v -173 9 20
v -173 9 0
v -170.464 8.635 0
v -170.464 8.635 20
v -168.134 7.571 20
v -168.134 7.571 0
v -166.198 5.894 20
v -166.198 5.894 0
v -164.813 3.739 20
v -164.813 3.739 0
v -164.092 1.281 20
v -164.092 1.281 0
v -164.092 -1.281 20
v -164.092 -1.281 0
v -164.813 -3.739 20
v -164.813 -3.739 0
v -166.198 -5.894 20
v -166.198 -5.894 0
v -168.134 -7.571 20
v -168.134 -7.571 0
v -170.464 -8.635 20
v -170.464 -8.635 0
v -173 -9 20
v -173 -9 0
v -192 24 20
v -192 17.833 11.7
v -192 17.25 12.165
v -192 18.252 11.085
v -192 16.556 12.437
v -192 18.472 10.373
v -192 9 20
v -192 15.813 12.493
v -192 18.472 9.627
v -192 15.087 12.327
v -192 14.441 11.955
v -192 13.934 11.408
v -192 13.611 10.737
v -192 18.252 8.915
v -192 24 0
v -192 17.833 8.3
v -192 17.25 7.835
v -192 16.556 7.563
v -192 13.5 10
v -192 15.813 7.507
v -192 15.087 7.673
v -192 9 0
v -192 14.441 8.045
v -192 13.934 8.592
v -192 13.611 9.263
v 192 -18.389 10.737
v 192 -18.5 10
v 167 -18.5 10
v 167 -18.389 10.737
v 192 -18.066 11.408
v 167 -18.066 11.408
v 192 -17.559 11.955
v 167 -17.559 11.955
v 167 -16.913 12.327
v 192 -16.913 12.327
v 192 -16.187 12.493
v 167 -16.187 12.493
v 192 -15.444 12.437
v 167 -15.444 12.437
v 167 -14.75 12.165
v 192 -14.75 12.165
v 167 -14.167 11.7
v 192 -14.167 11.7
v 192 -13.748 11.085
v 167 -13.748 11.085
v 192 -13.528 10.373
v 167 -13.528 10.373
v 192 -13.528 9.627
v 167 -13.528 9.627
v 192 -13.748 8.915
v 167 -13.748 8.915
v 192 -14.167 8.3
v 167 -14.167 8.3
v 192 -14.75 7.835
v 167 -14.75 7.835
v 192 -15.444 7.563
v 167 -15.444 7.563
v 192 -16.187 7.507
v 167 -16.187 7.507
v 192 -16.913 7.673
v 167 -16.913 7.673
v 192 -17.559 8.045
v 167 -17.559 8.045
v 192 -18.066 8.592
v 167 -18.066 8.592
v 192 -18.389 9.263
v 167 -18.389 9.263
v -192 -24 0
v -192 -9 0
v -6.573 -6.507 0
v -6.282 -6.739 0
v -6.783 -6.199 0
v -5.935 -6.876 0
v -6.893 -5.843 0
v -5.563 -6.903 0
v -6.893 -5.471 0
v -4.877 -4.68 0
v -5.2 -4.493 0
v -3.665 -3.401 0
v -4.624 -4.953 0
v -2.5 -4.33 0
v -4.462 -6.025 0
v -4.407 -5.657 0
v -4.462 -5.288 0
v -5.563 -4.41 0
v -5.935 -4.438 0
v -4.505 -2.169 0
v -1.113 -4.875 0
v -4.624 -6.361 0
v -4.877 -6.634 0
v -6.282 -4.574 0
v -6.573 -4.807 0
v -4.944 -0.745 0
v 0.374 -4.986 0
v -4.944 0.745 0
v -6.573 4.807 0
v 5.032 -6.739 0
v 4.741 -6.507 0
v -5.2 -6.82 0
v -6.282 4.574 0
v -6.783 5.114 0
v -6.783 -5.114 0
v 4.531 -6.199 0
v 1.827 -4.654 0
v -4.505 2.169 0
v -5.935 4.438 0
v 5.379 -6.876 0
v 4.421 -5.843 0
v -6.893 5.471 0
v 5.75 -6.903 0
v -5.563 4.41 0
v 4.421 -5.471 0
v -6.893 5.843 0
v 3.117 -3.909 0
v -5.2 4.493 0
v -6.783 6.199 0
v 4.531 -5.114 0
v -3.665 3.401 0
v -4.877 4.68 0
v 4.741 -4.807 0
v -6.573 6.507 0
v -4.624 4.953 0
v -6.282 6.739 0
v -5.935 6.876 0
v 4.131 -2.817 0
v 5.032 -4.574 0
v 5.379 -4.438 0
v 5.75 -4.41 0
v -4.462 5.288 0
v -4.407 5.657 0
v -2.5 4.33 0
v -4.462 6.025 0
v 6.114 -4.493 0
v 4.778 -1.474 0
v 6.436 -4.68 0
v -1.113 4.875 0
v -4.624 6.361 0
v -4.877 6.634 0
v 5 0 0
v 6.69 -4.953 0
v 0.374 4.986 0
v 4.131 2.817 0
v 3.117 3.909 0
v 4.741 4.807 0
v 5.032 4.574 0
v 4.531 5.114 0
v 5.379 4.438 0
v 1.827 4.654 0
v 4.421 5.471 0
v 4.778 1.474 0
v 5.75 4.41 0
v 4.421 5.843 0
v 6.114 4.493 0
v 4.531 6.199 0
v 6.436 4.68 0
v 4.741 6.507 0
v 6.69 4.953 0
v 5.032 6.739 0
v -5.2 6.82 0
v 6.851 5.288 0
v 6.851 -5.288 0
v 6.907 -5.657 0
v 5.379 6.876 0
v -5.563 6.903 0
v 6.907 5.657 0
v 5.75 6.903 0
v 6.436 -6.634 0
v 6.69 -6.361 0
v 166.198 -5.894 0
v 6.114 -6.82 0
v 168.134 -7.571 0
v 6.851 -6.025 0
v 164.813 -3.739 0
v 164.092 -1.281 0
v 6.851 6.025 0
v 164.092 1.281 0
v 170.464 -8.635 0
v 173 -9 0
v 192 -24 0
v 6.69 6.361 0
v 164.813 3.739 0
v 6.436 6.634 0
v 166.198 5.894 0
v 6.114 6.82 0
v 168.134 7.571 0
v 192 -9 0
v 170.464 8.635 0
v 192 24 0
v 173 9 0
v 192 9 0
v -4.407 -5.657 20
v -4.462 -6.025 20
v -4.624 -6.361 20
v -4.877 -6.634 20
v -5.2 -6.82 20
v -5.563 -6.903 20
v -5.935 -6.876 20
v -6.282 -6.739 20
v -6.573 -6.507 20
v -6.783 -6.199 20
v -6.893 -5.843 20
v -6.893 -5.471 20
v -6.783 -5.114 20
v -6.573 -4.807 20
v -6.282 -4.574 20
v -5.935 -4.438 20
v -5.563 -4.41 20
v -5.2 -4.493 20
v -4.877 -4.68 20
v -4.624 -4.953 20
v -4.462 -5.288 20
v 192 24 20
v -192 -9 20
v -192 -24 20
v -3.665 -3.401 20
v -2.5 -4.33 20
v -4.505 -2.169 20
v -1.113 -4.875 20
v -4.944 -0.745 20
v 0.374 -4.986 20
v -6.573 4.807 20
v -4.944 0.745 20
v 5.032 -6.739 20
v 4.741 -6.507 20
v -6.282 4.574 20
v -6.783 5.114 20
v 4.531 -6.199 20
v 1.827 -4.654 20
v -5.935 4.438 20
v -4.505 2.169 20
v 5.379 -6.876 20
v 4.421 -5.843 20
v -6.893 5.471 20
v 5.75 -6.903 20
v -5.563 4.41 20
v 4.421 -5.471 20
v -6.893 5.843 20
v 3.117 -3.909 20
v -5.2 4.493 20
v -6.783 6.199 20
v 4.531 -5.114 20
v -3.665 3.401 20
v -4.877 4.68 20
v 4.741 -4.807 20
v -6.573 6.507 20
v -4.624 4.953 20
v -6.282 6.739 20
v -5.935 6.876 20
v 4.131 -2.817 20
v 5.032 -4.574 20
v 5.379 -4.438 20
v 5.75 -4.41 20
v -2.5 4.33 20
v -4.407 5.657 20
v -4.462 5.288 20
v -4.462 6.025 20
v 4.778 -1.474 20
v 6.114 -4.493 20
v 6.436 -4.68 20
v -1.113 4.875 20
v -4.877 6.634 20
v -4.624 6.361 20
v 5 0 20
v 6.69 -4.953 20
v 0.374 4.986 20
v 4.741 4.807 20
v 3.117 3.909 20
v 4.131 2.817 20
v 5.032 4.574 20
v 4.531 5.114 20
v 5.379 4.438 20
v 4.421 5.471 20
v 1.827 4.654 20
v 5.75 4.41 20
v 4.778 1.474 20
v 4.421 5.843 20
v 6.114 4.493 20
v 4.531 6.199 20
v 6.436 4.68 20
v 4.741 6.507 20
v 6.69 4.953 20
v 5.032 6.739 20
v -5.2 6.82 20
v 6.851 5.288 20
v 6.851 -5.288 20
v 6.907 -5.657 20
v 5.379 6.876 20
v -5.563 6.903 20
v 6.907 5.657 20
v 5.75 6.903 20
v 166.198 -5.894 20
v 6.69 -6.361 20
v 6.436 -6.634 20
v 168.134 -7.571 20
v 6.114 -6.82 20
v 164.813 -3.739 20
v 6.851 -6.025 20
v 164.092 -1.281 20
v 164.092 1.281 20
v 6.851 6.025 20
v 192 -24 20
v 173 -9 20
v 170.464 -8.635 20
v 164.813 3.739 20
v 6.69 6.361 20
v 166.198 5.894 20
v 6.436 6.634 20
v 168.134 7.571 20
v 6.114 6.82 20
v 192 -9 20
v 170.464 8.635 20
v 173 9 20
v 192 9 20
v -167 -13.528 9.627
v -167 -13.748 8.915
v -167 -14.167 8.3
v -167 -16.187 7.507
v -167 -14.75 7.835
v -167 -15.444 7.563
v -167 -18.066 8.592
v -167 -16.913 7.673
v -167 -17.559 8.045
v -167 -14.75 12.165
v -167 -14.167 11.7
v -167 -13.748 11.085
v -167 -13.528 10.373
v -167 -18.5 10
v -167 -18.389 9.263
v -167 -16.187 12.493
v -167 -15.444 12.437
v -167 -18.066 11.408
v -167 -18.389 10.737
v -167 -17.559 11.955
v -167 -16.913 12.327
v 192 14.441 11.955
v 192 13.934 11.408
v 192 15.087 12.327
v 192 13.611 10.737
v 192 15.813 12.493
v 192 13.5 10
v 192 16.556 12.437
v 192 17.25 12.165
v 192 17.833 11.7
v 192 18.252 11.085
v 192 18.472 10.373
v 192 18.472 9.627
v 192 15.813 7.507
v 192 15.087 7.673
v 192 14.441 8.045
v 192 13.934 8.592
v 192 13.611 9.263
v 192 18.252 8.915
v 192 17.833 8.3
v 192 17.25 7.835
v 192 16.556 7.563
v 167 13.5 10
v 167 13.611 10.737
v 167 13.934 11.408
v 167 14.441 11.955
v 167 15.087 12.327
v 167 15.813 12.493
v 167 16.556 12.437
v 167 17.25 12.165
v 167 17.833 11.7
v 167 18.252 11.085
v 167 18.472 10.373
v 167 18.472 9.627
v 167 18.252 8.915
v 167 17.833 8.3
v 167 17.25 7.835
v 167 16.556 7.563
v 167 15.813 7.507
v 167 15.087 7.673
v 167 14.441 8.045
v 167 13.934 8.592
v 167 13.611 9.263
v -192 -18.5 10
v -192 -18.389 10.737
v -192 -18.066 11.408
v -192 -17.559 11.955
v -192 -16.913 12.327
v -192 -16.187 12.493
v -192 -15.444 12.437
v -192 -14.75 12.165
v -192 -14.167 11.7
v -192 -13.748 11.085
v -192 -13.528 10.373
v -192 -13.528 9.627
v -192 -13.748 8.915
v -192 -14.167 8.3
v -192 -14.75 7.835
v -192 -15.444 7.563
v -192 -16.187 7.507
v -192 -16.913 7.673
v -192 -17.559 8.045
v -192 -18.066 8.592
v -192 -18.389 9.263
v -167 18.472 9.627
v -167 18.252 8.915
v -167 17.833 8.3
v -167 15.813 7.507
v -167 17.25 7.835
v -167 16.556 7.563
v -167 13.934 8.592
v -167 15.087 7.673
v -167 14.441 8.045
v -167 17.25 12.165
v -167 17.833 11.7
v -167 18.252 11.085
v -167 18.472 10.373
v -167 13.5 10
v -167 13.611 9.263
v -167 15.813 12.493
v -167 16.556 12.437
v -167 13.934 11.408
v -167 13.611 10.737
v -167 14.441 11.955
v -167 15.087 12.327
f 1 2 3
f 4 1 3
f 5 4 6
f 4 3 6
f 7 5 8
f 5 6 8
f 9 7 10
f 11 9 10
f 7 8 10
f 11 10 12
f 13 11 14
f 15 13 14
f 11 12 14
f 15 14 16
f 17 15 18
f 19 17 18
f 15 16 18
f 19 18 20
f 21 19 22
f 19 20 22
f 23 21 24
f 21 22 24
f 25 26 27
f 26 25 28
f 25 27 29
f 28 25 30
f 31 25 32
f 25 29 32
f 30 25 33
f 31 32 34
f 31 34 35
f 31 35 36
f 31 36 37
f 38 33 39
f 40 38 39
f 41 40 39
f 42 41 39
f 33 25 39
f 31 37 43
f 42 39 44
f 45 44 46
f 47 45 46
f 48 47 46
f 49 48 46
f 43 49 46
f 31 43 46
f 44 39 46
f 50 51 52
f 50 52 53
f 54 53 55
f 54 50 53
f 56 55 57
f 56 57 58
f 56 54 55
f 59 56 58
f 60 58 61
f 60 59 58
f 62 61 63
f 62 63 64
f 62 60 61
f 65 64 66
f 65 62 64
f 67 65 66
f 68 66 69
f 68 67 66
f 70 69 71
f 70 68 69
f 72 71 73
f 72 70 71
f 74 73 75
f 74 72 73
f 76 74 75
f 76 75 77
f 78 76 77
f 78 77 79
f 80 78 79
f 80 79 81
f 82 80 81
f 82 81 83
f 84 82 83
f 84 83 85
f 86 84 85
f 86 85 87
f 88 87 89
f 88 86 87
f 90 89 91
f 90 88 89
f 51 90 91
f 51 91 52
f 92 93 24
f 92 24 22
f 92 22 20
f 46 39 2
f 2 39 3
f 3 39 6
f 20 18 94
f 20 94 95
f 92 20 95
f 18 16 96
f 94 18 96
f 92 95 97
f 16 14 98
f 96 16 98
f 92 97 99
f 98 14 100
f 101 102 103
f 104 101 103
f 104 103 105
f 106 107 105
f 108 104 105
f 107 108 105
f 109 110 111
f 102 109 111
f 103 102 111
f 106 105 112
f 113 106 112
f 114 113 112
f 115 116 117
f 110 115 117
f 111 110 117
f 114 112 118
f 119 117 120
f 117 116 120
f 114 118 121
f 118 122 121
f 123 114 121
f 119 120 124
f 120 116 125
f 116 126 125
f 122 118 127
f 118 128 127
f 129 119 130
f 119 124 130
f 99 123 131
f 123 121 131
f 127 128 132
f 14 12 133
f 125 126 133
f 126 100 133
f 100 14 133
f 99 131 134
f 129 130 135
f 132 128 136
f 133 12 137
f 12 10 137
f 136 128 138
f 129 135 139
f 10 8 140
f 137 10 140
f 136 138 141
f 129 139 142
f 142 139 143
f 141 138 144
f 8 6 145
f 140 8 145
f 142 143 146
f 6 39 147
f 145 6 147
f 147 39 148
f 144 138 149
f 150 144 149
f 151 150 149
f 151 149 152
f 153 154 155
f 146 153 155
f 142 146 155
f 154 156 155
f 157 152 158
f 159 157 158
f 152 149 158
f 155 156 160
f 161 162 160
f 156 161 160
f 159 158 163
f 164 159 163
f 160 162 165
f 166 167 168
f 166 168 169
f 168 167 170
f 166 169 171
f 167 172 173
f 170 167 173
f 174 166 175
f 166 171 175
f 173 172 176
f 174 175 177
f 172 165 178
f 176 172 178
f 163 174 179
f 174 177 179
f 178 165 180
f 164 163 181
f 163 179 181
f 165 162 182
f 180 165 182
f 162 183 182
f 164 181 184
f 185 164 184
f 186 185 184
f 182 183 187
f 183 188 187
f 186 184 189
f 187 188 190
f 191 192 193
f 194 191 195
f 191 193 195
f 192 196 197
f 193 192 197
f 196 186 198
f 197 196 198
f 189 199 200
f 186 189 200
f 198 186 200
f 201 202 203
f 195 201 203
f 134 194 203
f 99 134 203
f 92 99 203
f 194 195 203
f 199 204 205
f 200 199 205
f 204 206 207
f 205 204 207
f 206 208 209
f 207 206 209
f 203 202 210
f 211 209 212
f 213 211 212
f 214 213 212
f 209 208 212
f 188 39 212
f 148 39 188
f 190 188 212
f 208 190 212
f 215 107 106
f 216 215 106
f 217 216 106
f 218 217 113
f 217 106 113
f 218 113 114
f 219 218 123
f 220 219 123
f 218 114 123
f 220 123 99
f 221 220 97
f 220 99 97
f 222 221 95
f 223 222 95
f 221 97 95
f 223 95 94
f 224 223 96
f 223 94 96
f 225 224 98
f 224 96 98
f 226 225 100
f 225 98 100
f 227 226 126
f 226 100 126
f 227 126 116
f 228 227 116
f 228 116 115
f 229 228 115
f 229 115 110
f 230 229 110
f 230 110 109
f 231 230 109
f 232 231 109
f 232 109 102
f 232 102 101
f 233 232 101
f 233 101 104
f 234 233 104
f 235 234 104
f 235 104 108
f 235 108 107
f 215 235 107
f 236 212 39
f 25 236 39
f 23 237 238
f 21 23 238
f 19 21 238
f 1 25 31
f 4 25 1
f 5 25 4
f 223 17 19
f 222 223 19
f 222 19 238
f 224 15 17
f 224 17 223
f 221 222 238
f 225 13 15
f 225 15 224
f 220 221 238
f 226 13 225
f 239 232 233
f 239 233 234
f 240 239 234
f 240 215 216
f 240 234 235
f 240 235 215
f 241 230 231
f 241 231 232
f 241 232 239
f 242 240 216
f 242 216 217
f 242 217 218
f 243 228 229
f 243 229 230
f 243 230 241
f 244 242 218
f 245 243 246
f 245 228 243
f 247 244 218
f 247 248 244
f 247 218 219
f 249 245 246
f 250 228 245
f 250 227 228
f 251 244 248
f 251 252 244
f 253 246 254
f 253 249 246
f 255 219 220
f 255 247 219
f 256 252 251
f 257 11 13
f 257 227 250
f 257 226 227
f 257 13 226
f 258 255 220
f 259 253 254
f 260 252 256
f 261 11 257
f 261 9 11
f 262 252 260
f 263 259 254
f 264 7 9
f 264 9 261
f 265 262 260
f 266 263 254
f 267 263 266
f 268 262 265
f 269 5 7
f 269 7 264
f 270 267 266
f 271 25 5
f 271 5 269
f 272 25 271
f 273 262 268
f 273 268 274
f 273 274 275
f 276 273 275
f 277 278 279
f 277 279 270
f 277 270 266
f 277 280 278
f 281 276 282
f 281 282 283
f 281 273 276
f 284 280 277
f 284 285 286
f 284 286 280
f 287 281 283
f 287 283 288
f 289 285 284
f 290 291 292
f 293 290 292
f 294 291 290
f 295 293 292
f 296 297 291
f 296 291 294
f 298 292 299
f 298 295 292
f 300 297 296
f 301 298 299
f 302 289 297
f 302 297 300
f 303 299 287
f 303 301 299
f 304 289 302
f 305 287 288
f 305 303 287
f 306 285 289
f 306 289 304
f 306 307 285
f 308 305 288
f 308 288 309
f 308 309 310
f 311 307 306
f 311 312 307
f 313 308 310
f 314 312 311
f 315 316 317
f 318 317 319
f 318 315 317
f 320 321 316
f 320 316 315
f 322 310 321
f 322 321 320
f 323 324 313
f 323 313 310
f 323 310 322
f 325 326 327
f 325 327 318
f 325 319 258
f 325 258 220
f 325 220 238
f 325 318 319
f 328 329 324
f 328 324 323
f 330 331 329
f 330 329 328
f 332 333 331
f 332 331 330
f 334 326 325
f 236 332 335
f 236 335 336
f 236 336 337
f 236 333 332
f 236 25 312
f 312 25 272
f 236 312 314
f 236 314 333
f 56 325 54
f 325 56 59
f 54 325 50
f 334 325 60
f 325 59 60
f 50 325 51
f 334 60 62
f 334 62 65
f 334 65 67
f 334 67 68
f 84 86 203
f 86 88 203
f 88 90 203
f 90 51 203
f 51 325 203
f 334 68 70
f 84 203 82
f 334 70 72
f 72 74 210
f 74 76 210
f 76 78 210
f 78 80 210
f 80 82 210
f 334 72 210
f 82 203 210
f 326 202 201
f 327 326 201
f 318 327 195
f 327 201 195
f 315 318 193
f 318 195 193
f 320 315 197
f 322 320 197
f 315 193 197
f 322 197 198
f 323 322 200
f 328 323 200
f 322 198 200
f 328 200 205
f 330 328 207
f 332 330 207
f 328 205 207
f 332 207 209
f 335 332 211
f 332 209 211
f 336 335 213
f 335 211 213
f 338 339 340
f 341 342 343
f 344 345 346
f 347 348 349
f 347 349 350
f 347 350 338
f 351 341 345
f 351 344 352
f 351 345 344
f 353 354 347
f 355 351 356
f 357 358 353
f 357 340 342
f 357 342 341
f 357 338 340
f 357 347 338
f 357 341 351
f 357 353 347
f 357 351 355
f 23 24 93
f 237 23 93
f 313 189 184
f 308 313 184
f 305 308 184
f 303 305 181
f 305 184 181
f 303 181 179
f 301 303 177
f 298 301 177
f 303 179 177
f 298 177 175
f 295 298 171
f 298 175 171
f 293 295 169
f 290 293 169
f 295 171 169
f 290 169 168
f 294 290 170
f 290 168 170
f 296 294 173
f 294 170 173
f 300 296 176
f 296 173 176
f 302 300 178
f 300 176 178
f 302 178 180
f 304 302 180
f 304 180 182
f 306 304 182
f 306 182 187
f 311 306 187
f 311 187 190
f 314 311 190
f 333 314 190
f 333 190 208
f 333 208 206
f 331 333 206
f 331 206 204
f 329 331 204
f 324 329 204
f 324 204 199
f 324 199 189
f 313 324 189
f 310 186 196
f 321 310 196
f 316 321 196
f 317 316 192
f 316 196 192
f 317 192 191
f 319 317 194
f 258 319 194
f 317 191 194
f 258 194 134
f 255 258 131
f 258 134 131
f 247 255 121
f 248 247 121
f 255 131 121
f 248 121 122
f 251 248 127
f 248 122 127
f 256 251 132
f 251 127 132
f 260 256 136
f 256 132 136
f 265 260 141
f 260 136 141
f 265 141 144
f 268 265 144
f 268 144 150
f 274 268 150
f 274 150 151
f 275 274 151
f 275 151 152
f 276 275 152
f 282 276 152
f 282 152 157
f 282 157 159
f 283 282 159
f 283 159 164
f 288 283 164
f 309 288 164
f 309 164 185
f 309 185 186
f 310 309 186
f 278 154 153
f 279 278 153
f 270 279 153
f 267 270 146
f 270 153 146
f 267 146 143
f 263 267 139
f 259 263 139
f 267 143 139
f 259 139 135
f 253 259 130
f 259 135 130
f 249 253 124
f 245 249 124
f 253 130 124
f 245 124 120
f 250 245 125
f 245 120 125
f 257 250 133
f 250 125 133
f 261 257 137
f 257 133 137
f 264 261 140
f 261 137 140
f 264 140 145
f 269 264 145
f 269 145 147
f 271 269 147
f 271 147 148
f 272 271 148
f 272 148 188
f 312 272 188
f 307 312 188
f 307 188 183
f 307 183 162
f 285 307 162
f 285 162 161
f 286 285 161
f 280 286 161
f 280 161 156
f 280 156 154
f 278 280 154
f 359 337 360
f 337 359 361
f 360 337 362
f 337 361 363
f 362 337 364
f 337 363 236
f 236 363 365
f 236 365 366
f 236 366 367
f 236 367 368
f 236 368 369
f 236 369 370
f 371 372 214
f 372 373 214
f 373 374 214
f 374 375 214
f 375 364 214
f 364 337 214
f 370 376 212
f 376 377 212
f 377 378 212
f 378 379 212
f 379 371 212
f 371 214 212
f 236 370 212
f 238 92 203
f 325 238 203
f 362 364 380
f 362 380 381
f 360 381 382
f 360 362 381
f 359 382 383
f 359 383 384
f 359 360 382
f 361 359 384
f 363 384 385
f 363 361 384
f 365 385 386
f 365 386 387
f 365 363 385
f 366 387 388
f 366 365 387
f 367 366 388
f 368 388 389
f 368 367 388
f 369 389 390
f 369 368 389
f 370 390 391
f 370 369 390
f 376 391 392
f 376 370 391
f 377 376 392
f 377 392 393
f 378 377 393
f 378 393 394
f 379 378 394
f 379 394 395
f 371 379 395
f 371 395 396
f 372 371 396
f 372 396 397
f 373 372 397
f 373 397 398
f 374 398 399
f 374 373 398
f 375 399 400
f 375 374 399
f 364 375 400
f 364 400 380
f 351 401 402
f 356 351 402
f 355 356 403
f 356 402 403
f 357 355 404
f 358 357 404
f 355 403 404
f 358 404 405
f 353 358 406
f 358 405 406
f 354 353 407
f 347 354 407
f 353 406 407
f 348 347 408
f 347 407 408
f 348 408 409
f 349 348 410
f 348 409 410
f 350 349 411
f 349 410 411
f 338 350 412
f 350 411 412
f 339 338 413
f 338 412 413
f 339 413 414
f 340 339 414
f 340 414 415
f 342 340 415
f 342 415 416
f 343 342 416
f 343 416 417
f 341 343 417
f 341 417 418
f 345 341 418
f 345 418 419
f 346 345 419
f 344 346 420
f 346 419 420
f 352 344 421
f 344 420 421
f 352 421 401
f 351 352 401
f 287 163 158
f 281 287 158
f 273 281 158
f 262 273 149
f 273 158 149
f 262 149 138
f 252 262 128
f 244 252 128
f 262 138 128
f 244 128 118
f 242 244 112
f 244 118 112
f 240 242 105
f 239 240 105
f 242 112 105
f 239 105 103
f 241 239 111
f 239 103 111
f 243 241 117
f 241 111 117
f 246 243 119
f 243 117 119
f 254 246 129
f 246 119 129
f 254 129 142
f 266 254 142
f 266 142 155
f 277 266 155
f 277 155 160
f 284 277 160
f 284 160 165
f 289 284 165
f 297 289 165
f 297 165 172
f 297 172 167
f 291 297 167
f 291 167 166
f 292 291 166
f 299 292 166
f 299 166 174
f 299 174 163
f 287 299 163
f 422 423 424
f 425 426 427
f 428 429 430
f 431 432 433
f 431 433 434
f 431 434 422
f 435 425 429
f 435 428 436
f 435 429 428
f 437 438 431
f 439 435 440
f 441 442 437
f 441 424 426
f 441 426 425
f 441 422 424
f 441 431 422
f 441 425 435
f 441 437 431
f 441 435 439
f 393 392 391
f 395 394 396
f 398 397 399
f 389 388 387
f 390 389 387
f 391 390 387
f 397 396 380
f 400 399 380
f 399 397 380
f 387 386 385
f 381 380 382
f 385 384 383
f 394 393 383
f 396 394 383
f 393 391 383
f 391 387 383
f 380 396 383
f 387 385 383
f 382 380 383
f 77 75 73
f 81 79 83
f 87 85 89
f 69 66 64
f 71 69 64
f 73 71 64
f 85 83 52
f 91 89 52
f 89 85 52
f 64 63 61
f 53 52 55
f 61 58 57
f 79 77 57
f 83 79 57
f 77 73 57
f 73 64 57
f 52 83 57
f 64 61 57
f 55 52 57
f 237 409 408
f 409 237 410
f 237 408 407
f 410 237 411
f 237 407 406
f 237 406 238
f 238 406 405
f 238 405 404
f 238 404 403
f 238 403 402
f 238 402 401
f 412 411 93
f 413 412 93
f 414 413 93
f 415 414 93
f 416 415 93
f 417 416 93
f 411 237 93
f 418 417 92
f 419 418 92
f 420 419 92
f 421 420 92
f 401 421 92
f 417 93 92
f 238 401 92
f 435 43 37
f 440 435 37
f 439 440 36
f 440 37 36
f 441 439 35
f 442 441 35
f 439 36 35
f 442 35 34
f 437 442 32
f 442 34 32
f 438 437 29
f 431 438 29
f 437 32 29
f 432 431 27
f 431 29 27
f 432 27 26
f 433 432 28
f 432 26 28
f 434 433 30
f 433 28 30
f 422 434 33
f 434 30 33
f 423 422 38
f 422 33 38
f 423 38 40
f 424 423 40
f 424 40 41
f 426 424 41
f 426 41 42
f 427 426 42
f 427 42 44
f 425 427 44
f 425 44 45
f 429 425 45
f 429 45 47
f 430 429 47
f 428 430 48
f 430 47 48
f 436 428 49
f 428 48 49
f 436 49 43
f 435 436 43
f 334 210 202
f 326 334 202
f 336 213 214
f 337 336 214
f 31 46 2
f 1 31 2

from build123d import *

# Parameters (mm, degrees)
F1_DEPTH = 20
F2_R     = 2.5
F3_DEPTH = 25
F4_R     = 5
F4_R_2   = 1.25
F5_DEPTH = 25


# Not quite as in the source:
# - a pattern or mirror of a feature is missing from the dataset's text; its kind, count and spacing are read off the source's solid


with BuildPart() as f1:
    # F0 (on Top) → F1 (new body)
    with BuildSketch(Plane.XY):
        with BuildLine():
            Line((-192, -24), (192, -24))
            Line((192, -24), (192, -9))
            Line((192, -9), (173, -9))
            ThreePointArc((173, -9), (164, 0), (173, 9))
            Line((173, 9), (192, 9))
            Line((192, 9), (192, 24))
            Line((192, 24), (-192, 24))
            Line((-192, 24), (-192, 9))
            Line((-192, 9), (-173, 9))
            ThreePointArc((-173, 9), (-164, 0), (-173, -9))
            Line((-173, -9), (-192, -9))
            Line((-192, -9), (-192, -24))
        make_face()
    extrude(amount=F1_DEPTH)

    # F2 (on face) → F3 (cut)
    with BuildSketch(Plane(origin=(-192, 0, 0), x_dir=(0, -1, 0), z_dir=(-1, 0, 0))):
        with Locations((-16, 10)):
            Circle(F2_R)
        with Locations((16, 10)):
            Circle(F2_R)
    f3 = extrude(amount=-F3_DEPTH, mode=Mode.SUBTRACT)

    # F3_copies: F3 across plane
    add(f3.mirror(Plane(origin=(0, 0, 0), x_dir=(0, 0, 1), z_dir=(1, 0, 0))), mode=Mode.SUBTRACT)

    # F4 (on face) → F5 (cut)
    with BuildSketch(Plane(origin=(0, 0, 0), x_dir=(1, 0, 0), z_dir=(0, 0, -1))):
        Circle(F4_R)
        with Locations((-5.6568542495, 5.6568542495)):
            Circle(F4_R_2)
        with Locations((-5.6568542495, -5.6568542495)):
            Circle(F4_R_2)
        with Locations((5.6568542495, -5.6568542495)):
            Circle(F4_R_2)
        with Locations((5.6568542495, 5.6568542495)):
            Circle(F4_R_2)
    extrude(amount=-F5_DEPTH, mode=Mode.SUBTRACT)


solid = f1.part
